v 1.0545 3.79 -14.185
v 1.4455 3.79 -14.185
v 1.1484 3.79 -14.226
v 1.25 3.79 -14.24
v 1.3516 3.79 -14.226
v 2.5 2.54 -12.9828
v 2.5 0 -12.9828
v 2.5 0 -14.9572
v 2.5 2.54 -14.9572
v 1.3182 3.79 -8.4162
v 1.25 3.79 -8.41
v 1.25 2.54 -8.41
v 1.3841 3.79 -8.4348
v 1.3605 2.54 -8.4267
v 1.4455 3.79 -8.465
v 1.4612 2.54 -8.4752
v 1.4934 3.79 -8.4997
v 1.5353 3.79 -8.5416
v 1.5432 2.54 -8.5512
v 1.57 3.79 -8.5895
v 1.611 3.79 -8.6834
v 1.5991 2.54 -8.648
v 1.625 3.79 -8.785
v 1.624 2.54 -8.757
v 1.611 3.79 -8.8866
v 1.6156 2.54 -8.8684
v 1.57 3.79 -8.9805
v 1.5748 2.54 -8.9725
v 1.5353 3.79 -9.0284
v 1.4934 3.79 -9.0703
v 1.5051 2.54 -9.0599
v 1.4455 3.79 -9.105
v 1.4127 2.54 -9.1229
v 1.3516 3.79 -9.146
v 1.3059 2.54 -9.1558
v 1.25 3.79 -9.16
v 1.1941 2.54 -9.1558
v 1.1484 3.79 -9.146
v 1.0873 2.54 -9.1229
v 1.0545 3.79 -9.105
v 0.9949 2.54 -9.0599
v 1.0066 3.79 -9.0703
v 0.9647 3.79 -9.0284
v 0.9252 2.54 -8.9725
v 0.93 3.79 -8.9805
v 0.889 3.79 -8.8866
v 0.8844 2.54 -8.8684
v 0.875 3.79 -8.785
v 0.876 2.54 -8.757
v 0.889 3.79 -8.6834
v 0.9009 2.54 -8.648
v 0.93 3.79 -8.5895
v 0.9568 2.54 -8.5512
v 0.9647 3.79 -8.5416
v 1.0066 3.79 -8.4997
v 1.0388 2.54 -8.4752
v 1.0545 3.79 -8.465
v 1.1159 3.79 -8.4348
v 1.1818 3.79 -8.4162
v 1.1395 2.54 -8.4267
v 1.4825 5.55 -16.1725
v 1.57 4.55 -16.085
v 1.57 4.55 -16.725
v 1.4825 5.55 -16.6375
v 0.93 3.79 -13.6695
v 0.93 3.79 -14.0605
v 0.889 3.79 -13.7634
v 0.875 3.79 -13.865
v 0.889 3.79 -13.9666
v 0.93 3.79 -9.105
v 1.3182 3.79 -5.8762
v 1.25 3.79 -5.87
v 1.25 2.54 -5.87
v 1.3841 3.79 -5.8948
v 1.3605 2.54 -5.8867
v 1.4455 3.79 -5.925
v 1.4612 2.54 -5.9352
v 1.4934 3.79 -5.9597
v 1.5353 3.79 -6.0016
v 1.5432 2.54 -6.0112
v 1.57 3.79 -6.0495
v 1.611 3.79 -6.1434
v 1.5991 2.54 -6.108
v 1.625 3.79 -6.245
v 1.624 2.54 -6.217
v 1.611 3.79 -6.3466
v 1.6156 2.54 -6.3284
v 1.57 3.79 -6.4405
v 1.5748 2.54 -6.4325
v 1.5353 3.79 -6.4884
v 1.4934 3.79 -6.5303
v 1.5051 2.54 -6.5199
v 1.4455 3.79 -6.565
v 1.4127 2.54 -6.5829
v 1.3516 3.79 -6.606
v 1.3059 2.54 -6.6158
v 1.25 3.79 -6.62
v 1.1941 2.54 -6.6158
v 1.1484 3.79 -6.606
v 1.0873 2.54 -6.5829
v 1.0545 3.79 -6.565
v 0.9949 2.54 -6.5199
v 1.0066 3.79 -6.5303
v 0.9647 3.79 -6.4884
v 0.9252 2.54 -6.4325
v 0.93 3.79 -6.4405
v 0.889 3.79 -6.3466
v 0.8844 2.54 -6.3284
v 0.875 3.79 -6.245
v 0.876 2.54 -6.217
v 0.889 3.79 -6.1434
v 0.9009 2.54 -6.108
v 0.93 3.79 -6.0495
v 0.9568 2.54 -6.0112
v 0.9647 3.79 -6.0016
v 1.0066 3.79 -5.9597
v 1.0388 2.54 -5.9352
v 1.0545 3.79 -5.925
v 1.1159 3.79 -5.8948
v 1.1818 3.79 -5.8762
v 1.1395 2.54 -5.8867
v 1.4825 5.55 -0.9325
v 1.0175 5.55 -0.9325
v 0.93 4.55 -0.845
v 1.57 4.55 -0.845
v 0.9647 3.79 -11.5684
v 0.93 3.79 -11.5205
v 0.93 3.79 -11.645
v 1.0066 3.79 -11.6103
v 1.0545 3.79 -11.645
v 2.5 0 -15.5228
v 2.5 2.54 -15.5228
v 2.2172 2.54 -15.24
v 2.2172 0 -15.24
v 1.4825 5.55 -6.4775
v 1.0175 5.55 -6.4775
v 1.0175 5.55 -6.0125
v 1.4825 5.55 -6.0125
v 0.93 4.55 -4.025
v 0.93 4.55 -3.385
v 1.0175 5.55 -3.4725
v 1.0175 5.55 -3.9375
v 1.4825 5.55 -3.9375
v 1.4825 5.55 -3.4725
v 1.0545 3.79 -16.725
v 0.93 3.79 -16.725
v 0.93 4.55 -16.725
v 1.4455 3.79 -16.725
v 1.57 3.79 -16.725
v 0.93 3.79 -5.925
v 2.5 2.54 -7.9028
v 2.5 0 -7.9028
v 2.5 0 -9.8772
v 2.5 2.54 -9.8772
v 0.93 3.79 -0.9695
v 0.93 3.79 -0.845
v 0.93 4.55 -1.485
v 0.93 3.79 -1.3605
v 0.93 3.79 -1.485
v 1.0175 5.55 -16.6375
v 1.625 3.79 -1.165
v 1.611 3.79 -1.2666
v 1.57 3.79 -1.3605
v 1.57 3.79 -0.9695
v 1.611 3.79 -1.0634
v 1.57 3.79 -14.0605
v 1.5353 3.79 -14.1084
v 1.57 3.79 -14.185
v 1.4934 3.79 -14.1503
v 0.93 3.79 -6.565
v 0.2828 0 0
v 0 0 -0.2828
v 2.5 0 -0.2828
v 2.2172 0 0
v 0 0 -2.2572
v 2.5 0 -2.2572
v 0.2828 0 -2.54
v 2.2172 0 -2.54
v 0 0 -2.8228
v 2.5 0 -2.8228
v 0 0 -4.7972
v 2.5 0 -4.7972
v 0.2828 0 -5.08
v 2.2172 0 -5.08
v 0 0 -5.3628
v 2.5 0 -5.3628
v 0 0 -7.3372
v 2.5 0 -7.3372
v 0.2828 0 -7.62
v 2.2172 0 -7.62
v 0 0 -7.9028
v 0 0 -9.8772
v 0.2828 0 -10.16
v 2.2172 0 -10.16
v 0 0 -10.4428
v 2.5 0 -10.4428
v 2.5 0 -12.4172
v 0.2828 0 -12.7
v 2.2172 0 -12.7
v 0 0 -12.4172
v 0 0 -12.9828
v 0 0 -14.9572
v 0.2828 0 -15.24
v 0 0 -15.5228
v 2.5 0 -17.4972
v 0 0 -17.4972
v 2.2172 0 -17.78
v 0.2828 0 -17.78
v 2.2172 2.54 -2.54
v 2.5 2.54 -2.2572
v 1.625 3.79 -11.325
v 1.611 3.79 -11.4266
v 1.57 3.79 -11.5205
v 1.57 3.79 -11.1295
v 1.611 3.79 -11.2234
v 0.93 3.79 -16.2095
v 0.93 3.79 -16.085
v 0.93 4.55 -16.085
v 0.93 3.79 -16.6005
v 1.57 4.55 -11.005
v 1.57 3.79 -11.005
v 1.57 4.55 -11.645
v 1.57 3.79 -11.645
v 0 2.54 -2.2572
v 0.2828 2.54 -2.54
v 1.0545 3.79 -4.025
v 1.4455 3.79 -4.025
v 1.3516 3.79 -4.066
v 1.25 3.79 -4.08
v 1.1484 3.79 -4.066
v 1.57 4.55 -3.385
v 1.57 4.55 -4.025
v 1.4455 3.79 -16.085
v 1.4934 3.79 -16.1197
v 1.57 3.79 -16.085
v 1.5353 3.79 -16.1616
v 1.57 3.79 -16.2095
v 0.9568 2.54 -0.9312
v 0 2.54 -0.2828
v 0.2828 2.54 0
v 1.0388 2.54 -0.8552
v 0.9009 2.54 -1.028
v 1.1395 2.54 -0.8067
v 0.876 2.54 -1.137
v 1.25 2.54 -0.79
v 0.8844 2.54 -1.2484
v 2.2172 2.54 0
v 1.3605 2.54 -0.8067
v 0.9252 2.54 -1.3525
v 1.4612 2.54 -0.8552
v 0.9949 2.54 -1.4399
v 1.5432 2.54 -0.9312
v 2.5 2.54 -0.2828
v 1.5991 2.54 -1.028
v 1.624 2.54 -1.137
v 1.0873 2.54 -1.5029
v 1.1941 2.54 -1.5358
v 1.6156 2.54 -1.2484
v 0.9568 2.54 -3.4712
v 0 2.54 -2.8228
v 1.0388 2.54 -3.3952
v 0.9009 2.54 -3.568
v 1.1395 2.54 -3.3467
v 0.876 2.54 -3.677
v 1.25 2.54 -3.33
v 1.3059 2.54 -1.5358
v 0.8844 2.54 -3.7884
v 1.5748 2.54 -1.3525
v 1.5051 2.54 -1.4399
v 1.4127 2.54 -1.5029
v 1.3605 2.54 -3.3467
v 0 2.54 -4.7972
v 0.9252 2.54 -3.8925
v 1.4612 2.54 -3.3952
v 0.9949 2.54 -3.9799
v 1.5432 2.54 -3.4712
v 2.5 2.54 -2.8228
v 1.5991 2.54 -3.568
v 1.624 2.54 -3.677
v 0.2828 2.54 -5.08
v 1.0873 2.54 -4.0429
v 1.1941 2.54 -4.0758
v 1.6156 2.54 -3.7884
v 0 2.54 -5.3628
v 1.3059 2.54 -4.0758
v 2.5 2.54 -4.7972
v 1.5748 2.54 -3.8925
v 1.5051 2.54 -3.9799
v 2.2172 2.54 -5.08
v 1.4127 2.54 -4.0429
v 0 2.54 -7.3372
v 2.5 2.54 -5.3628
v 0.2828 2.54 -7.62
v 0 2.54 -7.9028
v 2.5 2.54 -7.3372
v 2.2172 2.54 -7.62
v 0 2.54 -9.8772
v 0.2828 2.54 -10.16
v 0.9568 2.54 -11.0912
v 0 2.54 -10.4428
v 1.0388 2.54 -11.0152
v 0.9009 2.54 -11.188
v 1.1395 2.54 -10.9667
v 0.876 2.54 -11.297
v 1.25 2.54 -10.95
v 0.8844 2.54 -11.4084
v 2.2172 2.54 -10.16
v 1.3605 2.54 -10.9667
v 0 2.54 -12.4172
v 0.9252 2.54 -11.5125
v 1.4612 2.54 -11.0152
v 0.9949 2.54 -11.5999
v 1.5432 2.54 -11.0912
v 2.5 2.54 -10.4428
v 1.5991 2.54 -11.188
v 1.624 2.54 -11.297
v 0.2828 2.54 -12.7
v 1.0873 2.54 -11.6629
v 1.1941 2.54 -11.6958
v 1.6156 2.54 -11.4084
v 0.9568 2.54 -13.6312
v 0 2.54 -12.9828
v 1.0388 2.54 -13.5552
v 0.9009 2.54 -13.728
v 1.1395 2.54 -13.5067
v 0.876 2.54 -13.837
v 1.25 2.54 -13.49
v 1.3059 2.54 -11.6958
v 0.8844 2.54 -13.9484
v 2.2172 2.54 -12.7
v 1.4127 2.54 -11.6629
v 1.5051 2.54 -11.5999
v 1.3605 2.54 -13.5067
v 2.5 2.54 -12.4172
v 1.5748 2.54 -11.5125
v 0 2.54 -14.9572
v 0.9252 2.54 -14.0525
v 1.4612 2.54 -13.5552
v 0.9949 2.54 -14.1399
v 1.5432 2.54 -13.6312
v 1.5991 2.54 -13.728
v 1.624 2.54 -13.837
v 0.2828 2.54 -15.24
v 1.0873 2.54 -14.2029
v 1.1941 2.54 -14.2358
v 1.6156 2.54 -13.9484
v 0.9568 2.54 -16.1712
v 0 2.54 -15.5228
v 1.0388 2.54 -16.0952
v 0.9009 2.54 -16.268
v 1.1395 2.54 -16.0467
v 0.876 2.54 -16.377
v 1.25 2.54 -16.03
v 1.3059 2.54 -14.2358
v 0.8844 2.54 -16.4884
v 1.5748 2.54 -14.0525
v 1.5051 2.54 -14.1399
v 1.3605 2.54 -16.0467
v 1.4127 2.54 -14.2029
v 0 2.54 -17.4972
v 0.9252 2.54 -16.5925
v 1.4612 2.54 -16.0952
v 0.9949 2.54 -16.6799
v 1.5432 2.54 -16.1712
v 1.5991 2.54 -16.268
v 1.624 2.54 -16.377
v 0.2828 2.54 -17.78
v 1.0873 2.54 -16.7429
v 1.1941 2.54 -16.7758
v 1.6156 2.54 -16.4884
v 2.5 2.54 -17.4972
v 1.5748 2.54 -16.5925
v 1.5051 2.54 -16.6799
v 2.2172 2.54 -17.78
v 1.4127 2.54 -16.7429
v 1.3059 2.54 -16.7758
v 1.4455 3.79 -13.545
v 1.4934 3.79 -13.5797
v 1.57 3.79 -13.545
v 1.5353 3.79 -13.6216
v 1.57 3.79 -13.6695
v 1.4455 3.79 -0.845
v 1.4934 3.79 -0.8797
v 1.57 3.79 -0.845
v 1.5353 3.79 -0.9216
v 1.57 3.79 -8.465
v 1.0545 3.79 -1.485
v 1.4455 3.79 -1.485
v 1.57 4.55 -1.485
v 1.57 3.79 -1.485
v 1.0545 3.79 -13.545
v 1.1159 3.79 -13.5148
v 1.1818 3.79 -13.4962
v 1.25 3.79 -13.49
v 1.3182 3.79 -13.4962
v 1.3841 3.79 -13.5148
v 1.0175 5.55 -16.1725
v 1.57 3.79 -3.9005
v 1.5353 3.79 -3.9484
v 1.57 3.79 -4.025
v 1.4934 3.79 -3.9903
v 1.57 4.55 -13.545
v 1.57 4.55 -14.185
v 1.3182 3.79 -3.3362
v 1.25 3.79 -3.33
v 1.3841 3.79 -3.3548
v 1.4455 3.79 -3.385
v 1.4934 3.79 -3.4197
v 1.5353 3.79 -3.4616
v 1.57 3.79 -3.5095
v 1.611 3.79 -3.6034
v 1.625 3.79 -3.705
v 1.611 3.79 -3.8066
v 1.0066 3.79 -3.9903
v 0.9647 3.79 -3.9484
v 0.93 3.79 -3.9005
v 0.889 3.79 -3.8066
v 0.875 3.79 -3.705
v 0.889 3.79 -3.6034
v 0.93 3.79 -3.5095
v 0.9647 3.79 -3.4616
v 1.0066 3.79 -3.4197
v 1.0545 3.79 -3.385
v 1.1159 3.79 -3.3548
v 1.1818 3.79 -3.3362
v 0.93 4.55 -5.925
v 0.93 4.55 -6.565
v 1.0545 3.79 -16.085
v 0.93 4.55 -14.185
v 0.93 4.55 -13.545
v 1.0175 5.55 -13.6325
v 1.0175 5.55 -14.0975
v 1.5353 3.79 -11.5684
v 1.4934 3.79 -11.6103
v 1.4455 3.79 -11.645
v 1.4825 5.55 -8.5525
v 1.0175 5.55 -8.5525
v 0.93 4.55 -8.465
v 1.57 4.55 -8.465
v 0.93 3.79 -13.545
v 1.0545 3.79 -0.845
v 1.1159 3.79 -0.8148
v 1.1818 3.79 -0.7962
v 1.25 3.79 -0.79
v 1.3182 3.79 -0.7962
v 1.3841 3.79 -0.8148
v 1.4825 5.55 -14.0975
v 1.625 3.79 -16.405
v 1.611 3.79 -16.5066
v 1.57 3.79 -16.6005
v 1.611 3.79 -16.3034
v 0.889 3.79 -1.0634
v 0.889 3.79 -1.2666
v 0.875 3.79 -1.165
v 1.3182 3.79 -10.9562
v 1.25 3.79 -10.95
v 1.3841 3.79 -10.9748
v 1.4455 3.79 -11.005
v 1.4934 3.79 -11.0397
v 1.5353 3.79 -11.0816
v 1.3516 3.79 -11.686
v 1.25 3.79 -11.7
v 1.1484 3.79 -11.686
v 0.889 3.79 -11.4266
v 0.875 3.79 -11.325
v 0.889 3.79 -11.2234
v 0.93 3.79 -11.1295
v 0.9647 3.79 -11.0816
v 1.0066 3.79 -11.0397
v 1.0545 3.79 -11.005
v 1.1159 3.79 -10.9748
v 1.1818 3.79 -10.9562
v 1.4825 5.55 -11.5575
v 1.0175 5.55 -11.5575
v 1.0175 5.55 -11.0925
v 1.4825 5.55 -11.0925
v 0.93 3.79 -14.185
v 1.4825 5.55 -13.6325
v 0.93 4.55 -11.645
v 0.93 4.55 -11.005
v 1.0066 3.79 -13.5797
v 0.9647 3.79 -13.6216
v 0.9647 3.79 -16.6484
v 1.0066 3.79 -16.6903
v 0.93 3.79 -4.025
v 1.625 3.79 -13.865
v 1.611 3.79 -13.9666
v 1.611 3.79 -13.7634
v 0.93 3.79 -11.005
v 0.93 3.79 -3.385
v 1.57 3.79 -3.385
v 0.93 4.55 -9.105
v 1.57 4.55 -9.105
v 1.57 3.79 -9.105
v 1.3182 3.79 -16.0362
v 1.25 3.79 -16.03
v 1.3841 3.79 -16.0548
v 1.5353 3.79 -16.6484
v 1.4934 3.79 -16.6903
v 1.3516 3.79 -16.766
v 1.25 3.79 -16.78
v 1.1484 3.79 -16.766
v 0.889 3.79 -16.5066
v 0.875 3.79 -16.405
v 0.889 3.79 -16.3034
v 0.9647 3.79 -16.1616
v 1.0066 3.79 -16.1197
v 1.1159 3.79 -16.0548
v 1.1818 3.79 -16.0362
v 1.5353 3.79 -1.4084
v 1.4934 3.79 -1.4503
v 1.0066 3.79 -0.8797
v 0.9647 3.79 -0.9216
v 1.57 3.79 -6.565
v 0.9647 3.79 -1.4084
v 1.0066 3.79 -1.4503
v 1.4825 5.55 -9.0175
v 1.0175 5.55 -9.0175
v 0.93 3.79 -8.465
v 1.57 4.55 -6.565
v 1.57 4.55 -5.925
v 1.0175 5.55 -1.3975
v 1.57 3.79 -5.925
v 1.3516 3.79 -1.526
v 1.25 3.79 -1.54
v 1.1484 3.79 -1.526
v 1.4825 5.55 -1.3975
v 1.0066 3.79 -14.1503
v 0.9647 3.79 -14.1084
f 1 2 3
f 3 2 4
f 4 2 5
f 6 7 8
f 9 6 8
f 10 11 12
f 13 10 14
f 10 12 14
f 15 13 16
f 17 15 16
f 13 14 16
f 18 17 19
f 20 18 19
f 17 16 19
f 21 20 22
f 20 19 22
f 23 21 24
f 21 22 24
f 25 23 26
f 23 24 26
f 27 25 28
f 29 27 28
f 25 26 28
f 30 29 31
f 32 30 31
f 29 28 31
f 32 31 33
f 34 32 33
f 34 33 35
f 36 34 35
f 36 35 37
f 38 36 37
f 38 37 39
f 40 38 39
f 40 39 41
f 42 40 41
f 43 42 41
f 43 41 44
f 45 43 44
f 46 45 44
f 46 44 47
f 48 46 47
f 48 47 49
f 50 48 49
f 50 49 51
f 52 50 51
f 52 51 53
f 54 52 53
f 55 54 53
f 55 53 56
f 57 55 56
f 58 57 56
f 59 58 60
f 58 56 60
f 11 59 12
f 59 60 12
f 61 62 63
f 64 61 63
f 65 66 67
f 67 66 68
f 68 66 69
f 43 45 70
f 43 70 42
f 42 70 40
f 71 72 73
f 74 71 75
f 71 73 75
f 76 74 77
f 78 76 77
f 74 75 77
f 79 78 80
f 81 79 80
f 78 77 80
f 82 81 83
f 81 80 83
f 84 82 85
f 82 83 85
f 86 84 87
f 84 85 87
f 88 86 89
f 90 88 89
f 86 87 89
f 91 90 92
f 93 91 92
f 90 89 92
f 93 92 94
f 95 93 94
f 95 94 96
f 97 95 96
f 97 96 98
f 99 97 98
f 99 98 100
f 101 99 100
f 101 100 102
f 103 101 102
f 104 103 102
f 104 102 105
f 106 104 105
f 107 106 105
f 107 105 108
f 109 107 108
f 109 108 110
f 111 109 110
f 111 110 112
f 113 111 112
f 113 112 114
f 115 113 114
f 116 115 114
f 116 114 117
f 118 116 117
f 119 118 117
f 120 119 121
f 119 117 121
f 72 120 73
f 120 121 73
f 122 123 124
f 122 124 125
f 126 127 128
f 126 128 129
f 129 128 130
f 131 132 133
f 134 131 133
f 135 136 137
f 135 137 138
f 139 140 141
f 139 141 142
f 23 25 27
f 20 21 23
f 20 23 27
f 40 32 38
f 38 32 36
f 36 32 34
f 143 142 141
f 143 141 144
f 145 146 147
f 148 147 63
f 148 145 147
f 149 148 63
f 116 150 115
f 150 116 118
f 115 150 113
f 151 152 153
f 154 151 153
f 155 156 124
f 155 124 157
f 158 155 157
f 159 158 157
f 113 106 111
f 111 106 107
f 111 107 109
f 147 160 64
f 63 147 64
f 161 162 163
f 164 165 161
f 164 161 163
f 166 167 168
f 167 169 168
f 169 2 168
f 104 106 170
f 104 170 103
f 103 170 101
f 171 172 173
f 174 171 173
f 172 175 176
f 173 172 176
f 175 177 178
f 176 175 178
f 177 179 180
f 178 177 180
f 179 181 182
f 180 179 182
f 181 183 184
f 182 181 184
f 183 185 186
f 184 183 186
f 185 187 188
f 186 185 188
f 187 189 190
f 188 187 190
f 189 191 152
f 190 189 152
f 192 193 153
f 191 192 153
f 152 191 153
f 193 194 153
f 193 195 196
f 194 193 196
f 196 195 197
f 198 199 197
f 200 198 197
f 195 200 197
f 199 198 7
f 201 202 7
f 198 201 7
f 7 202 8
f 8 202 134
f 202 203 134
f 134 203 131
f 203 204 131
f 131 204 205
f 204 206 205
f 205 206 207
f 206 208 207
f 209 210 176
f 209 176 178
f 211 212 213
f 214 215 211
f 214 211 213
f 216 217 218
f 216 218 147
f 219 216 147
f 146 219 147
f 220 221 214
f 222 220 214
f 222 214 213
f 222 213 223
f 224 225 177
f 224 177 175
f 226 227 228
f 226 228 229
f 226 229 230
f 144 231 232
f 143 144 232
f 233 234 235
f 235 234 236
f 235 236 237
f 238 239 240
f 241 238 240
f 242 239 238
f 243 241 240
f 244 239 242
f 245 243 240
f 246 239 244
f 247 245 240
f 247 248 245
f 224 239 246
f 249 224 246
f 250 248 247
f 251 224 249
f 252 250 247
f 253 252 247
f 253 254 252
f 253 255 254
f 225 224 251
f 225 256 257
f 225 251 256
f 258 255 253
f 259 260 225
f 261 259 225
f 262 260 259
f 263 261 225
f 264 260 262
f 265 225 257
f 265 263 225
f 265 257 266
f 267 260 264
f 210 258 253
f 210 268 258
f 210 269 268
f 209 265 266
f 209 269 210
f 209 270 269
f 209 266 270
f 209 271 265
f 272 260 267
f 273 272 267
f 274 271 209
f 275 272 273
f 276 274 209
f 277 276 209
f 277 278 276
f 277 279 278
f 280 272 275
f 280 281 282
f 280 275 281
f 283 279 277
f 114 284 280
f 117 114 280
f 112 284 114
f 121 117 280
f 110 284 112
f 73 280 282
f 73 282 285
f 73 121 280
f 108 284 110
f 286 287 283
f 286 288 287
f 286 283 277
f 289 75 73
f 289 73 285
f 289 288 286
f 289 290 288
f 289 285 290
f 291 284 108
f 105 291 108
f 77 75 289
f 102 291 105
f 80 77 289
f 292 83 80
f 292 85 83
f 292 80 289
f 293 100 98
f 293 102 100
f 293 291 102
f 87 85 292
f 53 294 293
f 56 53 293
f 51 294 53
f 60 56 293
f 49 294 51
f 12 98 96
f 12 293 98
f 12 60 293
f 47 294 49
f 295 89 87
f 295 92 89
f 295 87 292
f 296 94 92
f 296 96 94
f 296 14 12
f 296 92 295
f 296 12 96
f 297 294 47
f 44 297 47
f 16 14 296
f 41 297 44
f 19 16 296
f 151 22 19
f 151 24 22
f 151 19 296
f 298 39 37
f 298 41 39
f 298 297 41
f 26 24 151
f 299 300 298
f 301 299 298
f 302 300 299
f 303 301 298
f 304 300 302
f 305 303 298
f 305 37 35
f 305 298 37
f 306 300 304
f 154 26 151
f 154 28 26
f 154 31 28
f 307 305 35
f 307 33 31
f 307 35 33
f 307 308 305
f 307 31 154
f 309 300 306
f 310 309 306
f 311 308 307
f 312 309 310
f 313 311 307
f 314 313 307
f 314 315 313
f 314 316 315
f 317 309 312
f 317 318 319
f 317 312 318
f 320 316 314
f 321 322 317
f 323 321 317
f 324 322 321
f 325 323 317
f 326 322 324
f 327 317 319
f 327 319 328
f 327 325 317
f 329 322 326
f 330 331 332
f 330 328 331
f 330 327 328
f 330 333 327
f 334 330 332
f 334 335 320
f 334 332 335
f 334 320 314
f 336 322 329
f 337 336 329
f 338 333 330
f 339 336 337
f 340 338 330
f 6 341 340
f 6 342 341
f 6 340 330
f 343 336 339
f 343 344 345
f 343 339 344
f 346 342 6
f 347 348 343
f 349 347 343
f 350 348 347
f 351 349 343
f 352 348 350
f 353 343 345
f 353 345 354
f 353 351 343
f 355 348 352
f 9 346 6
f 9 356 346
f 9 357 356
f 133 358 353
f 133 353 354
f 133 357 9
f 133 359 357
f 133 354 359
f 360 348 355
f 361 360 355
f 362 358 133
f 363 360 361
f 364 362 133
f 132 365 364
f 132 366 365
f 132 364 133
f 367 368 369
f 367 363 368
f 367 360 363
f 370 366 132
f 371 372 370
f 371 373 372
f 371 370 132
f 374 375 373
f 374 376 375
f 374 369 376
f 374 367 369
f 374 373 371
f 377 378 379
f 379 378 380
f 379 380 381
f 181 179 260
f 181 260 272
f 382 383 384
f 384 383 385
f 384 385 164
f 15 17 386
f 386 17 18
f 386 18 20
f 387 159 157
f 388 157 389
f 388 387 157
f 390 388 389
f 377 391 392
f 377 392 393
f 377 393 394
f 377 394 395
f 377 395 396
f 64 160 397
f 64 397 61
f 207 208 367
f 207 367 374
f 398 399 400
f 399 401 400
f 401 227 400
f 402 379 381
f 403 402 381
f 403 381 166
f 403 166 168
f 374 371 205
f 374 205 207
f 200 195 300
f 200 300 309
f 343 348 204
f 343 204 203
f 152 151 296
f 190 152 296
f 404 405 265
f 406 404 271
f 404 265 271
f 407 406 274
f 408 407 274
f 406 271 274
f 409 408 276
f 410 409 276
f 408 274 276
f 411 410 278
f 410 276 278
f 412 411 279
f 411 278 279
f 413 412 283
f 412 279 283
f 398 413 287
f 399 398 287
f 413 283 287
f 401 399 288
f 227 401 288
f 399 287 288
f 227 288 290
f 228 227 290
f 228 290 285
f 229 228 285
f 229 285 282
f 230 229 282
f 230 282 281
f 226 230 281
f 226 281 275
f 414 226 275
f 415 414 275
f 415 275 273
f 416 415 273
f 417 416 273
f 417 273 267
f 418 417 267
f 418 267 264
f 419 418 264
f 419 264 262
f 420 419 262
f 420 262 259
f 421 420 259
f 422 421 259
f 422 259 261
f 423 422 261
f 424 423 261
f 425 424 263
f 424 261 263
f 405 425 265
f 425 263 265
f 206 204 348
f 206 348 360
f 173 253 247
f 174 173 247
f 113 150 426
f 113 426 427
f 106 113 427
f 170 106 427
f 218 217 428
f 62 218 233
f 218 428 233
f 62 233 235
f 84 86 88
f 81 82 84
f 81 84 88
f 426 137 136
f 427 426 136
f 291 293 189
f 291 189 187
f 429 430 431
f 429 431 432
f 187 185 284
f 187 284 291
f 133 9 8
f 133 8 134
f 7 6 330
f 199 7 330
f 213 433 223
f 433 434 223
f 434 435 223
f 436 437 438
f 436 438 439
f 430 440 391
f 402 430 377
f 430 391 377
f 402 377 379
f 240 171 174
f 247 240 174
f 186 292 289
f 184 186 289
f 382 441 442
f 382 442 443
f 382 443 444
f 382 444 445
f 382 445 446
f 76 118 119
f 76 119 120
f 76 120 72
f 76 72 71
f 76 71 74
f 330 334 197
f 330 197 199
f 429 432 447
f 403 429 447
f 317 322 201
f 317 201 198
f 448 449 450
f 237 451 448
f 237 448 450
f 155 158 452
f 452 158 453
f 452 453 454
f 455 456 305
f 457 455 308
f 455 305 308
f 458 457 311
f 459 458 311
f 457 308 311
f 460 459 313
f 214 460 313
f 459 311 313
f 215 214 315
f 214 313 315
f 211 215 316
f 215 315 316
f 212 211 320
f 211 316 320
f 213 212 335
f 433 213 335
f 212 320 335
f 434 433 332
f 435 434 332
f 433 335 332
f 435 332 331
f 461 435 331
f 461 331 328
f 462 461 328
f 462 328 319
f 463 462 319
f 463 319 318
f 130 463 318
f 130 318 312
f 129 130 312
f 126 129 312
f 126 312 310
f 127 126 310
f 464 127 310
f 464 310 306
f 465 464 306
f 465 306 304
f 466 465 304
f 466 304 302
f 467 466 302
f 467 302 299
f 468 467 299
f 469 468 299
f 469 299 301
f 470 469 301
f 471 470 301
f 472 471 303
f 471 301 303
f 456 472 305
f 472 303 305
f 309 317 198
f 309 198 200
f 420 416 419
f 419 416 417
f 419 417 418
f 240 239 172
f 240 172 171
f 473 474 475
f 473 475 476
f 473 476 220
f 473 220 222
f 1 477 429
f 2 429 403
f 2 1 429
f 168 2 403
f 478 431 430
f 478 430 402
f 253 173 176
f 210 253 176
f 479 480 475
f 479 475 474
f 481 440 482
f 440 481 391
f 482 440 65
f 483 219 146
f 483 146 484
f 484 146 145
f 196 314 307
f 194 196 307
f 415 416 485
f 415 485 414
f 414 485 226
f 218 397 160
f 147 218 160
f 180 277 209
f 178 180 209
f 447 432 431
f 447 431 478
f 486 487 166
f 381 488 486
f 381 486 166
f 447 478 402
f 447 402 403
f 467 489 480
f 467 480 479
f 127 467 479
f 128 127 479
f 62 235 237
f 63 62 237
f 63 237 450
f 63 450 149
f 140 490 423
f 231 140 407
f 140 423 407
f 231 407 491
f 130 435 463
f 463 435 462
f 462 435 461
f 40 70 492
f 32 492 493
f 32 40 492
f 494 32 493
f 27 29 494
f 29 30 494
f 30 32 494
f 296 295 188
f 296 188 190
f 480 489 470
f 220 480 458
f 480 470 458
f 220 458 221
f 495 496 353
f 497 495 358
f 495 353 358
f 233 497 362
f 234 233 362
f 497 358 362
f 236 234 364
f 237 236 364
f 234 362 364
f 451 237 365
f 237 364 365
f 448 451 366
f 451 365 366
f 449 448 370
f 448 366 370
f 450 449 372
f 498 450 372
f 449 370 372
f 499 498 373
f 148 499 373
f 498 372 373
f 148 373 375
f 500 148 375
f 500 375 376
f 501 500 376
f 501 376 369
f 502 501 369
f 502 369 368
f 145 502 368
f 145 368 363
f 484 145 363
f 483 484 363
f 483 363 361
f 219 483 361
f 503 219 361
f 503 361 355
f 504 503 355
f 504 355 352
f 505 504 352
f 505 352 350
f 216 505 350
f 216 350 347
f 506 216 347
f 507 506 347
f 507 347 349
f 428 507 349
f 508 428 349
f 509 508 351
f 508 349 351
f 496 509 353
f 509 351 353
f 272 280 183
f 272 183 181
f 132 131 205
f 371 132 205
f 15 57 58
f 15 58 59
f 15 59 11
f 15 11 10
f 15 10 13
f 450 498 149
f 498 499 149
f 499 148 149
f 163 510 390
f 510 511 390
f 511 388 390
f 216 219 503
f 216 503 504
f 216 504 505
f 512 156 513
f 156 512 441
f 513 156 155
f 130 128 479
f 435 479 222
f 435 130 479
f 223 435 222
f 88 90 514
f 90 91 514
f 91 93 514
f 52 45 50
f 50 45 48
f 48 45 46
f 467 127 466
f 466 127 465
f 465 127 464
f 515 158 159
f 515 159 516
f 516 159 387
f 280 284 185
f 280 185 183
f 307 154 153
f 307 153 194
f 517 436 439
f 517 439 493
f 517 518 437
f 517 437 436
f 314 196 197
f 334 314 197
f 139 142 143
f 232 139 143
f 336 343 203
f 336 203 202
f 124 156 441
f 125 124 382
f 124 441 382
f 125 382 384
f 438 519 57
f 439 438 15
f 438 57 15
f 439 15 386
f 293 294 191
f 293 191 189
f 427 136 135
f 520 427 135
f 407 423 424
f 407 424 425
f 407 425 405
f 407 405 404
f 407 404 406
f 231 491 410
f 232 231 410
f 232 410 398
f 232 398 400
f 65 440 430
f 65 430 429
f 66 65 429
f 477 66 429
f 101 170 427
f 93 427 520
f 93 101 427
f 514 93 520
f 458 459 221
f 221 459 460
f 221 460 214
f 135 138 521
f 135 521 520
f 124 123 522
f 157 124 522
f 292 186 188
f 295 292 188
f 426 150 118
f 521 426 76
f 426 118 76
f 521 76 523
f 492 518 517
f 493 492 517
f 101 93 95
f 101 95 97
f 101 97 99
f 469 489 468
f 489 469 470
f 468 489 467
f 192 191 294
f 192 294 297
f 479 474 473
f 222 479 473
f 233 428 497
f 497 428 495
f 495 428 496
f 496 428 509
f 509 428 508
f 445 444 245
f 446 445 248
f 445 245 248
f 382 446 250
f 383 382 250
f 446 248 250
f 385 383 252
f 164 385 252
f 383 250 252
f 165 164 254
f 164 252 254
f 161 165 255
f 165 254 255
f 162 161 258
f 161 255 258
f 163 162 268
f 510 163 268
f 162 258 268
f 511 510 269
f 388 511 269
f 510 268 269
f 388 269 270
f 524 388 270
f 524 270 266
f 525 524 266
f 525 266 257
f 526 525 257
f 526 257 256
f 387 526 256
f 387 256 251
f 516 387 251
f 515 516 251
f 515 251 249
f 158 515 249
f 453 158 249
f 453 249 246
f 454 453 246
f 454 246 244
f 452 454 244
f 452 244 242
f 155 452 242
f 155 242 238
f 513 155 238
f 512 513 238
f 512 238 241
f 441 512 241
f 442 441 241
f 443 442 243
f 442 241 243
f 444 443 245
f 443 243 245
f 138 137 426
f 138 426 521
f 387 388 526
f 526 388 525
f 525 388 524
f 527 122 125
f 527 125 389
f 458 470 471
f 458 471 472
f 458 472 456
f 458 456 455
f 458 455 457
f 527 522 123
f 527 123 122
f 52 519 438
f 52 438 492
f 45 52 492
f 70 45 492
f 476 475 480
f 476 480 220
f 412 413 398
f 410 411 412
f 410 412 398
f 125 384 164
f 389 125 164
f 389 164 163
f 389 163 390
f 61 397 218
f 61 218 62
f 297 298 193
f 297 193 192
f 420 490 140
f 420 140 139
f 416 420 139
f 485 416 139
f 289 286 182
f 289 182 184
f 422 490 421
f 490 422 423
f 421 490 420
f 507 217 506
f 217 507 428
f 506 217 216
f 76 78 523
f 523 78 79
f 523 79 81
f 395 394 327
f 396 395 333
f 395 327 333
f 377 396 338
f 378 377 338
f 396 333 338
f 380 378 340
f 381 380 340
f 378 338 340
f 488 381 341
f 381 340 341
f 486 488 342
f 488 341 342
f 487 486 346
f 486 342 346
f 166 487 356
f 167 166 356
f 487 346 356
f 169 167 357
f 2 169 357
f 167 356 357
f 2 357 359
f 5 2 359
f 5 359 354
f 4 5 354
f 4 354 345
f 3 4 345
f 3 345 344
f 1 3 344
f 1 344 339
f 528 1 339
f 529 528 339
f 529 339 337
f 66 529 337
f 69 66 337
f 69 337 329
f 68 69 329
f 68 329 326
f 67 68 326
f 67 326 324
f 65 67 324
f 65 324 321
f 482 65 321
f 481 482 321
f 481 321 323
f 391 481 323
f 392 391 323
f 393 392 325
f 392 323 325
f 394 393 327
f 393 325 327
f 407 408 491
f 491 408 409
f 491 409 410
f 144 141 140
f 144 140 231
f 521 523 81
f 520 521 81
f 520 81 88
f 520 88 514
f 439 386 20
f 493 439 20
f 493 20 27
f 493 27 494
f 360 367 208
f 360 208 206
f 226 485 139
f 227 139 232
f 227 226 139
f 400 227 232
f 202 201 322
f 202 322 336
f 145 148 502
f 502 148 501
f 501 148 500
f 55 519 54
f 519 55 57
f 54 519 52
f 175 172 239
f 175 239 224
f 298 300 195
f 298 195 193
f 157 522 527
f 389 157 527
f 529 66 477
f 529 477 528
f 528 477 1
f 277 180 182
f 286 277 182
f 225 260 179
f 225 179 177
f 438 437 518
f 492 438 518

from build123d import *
from OCP.BRepFilletAPI import BRepFilletAPI_MakeChamfer

# Parameters (mm, degrees)
SKETCH1_W           = 2.5
SKETCH1_H           = 2.54
BOSS_EXTRUDE1_DEPTH = 2.54
SKETCH3_R           = 0.375
BOSS_EXTRUDE2_DEPTH = 1.25
SKETCH4_W           = 0.64
SKETCH4_H           = 0.64
BOSS_EXTRUDE3_DEPTH = 1.76
CUT_EXTRUDE1_DEPTH  = 2.54
LPATTERN5_COUNT     = 7
LPATTERN5_PITCH     = 2.54
CHAMFER3_SIZE       = 1
CHAMFER3_SIZE2      = 0.087488664


with BuildPart() as part:
    # Sketch1 → Boss-Extrude1 (new body)
    with BuildSketch(Plane(origin=(0, 0, 0), x_dir=(1, 0, 0), z_dir=(0, 1, 0))):
        with Locations((1.25, 1.27)):
            Rectangle(SKETCH1_W, SKETCH1_H)
    boss_extrude1 = extrude(amount=BOSS_EXTRUDE1_DEPTH)

    # Sketch3 → Boss-Extrude2 (add)
    with BuildSketch(Plane(origin=(0, 2.54, 0), x_dir=(1, 0, 0), z_dir=(0, 1, 0))):
        with Locations(Location((1.25, 1.165, 0), (0, 0, 270))):
            Circle(SKETCH3_R)
    boss_extrude2 = extrude(amount=BOSS_EXTRUDE2_DEPTH)

    # Sketch4 → Boss-Extrude3 (add)
    with BuildSketch(Plane(origin=(0, 3.79, 0), x_dir=(1, 0, 0), z_dir=(0, 1, 0))):
        with Locations((1.25, 1.165)):
            Rectangle(SKETCH4_W, SKETCH4_H)
    boss_extrude3 = extrude(amount=BOSS_EXTRUDE3_DEPTH)

    # Sketch5 → Cut-Extrude1 (cut)
    with BuildSketch(Plane(origin=(0, 2.54, 0), x_dir=(1, 0, 0), z_dir=(0, 1, 0))):
        Polygon((0.282842712, 2.54), (0, 2.257157288), (0, 2.54), align=None)
        Polygon((2.5, 2.54), (2.5, 2.257157288), (2.217157288, 2.54), align=None)
        Polygon((2.5, 0), (2.5, 0.282842712), (2.217157288, 0), align=None)
        Polygon((0, 0), (0, 0.282842712), (0.282842712, 0), align=None)
    cut_extrude1 = extrude(amount=-CUT_EXTRUDE1_DEPTH, mode=Mode.SUBTRACT)

    # LPattern5: Boss-Extrude1, Boss-Extrude2, Boss-Extrude3, Cut-Extrude1 ×7
    with Locations(*[(0, 0, -i * LPATTERN5_PITCH) for i in range(1, LPATTERN5_COUNT)]):
        add(boss_extrude1)
        add(boss_extrude2)
        add(boss_extrude3)
        add(cut_extrude1, mode=Mode.SUBTRACT)

    # Chamfer3: one chamfer whose edges measure the first distance from different faces: ONE call of the kernel's chamfer builder (chamfer() names one face for all edges)
    chamfer3_edges_1 = [part.edges().sort_by_distance(p)[0] for p in [
        (1.57, 5.55, -3.705),
    ]]
    chamfer3_side_1 = [part.faces().sort_by_distance(p)[0] for p in [
        (1.57, 4.67, -3.705),
    ]]
    chamfer3_edges_2 = [part.edges().sort_by_distance(p)[0] for p in [
        (1.25, 5.55, -4.025),
    ]]
    chamfer3_side_2 = [part.faces().sort_by_distance(p)[0] for p in [
        (1.25, 4.67, -4.025),
    ]]
    chamfer3_edges_3 = [part.edges().sort_by_distance(p)[0] for p in [
        (0.93, 5.55, -3.705),
    ]]
    chamfer3_side_3 = [part.faces().sort_by_distance(p)[0] for p in [
        (0.93, 4.67, -3.705),
    ]]
    chamfer3_edges_4 = [part.edges().sort_by_distance(p)[0] for p in [
        (1.25, 5.55, -3.385),
    ]]
    chamfer3_side_4 = [part.faces().sort_by_distance(p)[0] for p in [
        (1.25, 4.67, -3.385),
    ]]
    chamfer3_edges_5 = [part.edges().sort_by_distance(p)[0] for p in [
        (1.57, 5.55, -6.245),
    ]]
    chamfer3_side_5 = [part.faces().sort_by_distance(p)[0] for p in [
        (1.57, 4.67, -6.245),
    ]]
    chamfer3_edges_6 = [part.edges().sort_by_distance(p)[0] for p in [
        (1.25, 5.55, -6.565),
    ]]
    chamfer3_side_6 = [part.faces().sort_by_distance(p)[0] for p in [
        (1.25, 4.67, -6.565),
    ]]
    chamfer3_edges_7 = [part.edges().sort_by_distance(p)[0] for p in [
        (0.93, 5.55, -6.245),
    ]]
    chamfer3_side_7 = [part.faces().sort_by_distance(p)[0] for p in [
        (0.93, 4.67, -6.245),
    ]]
    chamfer3_edges_8 = [part.edges().sort_by_distance(p)[0] for p in [
        (1.25, 5.55, -5.925),
    ]]
    chamfer3_side_8 = [part.faces().sort_by_distance(p)[0] for p in [
        (1.25, 4.67, -5.925),
    ]]
    chamfer3_edges_9 = [part.edges().sort_by_distance(p)[0] for p in [
        (1.57, 5.55, -8.785),
    ]]
    chamfer3_side_9 = [part.faces().sort_by_distance(p)[0] for p in [
        (1.57, 4.67, -8.785),
    ]]
    chamfer3_edges_10 = [part.edges().sort_by_distance(p)[0] for p in [
        (1.25, 5.55, -9.105),
    ]]
    chamfer3_side_10 = [part.faces().sort_by_distance(p)[0] for p in [
        (1.25, 4.67, -9.105),
    ]]
    chamfer3_edges_11 = [part.edges().sort_by_distance(p)[0] for p in [
        (0.93, 5.55, -8.785),
    ]]
    chamfer3_side_11 = [part.faces().sort_by_distance(p)[0] for p in [
        (0.93, 4.67, -8.785),
    ]]
    chamfer3_edges_12 = [part.edges().sort_by_distance(p)[0] for p in [
        (1.25, 5.55, -8.465),
    ]]
    chamfer3_side_12 = [part.faces().sort_by_distance(p)[0] for p in [
        (1.25, 4.67, -8.465),
    ]]
    chamfer3_edges_13 = [part.edges().sort_by_distance(p)[0] for p in [
        (1.57, 5.55, -11.325),
    ]]
    chamfer3_side_13 = [part.faces().sort_by_distance(p)[0] for p in [
        (1.57, 4.67, -11.325),
    ]]
    chamfer3_edges_14 = [part.edges().sort_by_distance(p)[0] for p in [
        (1.25, 5.55, -11.645),
    ]]
    chamfer3_side_14 = [part.faces().sort_by_distance(p)[0] for p in [
        (1.25, 4.67, -11.645),
    ]]
    chamfer3_edges_15 = [part.edges().sort_by_distance(p)[0] for p in [
        (0.93, 5.55, -11.325),
    ]]
    chamfer3_side_15 = [part.faces().sort_by_distance(p)[0] for p in [
        (0.93, 4.67, -11.325),
    ]]
    chamfer3_edges_16 = [part.edges().sort_by_distance(p)[0] for p in [
        (1.25, 5.55, -11.005),
    ]]
    chamfer3_side_16 = [part.faces().sort_by_distance(p)[0] for p in [
        (1.25, 4.67, -11.005),
    ]]
    chamfer3_edges_17 = [part.edges().sort_by_distance(p)[0] for p in [
        (1.57, 5.55, -13.865),
    ]]
    chamfer3_side_17 = [part.faces().sort_by_distance(p)[0] for p in [
        (1.57, 4.67, -13.865),
    ]]
    chamfer3_edges_18 = [part.edges().sort_by_distance(p)[0] for p in [
        (1.25, 5.55, -14.185),
    ]]
    chamfer3_side_18 = [part.faces().sort_by_distance(p)[0] for p in [
        (1.25, 4.67, -14.185),
    ]]
    chamfer3_edges_19 = [part.edges().sort_by_distance(p)[0] for p in [
        (0.93, 5.55, -13.865),
    ]]
    chamfer3_side_19 = [part.faces().sort_by_distance(p)[0] for p in [
        (0.93, 4.67, -13.865),
    ]]
    chamfer3_edges_20 = [part.edges().sort_by_distance(p)[0] for p in [
        (1.25, 5.55, -13.545),
    ]]
    chamfer3_side_20 = [part.faces().sort_by_distance(p)[0] for p in [
        (1.25, 4.67, -13.545),
    ]]
    chamfer3_edges_21 = [part.edges().sort_by_distance(p)[0] for p in [
        (1.57, 5.55, -16.405),
    ]]
    chamfer3_side_21 = [part.faces().sort_by_distance(p)[0] for p in [
        (1.57, 4.67, -16.405),
    ]]
    chamfer3_edges_22 = [part.edges().sort_by_distance(p)[0] for p in [
        (1.25, 5.55, -16.725),
    ]]
    chamfer3_side_22 = [part.faces().sort_by_distance(p)[0] for p in [
        (1.25, 4.67, -16.725),
    ]]
    chamfer3_edges_23 = [part.edges().sort_by_distance(p)[0] for p in [
        (0.93, 5.55, -16.405),
    ]]
    chamfer3_side_23 = [part.faces().sort_by_distance(p)[0] for p in [
        (0.93, 4.67, -16.405),
    ]]
    chamfer3_edges_24 = [part.edges().sort_by_distance(p)[0] for p in [
        (1.25, 5.55, -16.085),
    ]]
    chamfer3_side_24 = [part.faces().sort_by_distance(p)[0] for p in [
        (1.25, 4.67, -16.085),
    ]]
    chamfer3_edges_25 = [part.edges().sort_by_distance(p)[0] for p in [
        (1.57, 5.55, -1.165),
    ]]
    chamfer3_side_25 = [part.faces().sort_by_distance(p)[0] for p in [
        (1.57, 4.67, -1.165),
    ]]
    chamfer3_edges_26 = [part.edges().sort_by_distance(p)[0] for p in [
        (1.25, 5.55, -1.485),
    ]]
    chamfer3_side_26 = [part.faces().sort_by_distance(p)[0] for p in [
        (1.25, 4.67, -1.485),
    ]]
    chamfer3_edges_27 = [part.edges().sort_by_distance(p)[0] for p in [
        (0.93, 5.55, -1.165),
    ]]
    chamfer3_side_27 = [part.faces().sort_by_distance(p)[0] for p in [
        (0.93, 4.67, -1.165),
    ]]
    chamfer3_edges_28 = [part.edges().sort_by_distance(p)[0] for p in [
        (1.25, 5.55, -0.845),
    ]]
    chamfer3_side_28 = [part.faces().sort_by_distance(p)[0] for p in [
        (1.25, 4.67, -0.845),
    ]]
    chamfer3 = BRepFilletAPI_MakeChamfer(part.part.solid().wrapped)
    for e in chamfer3_edges_1:
        chamfer3.Add(CHAMFER3_SIZE, CHAMFER3_SIZE2, e.wrapped, chamfer3_side_1[0].wrapped)  # the first distance lies on this face
    for e in chamfer3_edges_2:
        chamfer3.Add(CHAMFER3_SIZE, CHAMFER3_SIZE2, e.wrapped, chamfer3_side_2[0].wrapped)  # the first distance lies on this face
    for e in chamfer3_edges_3:
        chamfer3.Add(CHAMFER3_SIZE, CHAMFER3_SIZE2, e.wrapped, chamfer3_side_3[0].wrapped)  # the first distance lies on this face
    for e in chamfer3_edges_4:
        chamfer3.Add(CHAMFER3_SIZE, CHAMFER3_SIZE2, e.wrapped, chamfer3_side_4[0].wrapped)  # the first distance lies on this face
    for e in chamfer3_edges_5:
        chamfer3.Add(CHAMFER3_SIZE, CHAMFER3_SIZE2, e.wrapped, chamfer3_side_5[0].wrapped)  # the first distance lies on this face
    for e in chamfer3_edges_6:
        chamfer3.Add(CHAMFER3_SIZE, CHAMFER3_SIZE2, e.wrapped, chamfer3_side_6[0].wrapped)  # the first distance lies on this face
    for e in chamfer3_edges_7:
        chamfer3.Add(CHAMFER3_SIZE, CHAMFER3_SIZE2, e.wrapped, chamfer3_side_7[0].wrapped)  # the first distance lies on this face
    for e in chamfer3_edges_8:
        chamfer3.Add(CHAMFER3_SIZE, CHAMFER3_SIZE2, e.wrapped, chamfer3_side_8[0].wrapped)  # the first distance lies on this face
    for e in chamfer3_edges_9:
        chamfer3.Add(CHAMFER3_SIZE, CHAMFER3_SIZE2, e.wrapped, chamfer3_side_9[0].wrapped)  # the first distance lies on this face
    for e in chamfer3_edges_10:
        chamfer3.Add(CHAMFER3_SIZE, CHAMFER3_SIZE2, e.wrapped, chamfer3_side_10[0].wrapped)  # the first distance lies on this face
    for e in chamfer3_edges_11:
        chamfer3.Add(CHAMFER3_SIZE, CHAMFER3_SIZE2, e.wrapped, chamfer3_side_11[0].wrapped)  # the first distance lies on this face
    for e in chamfer3_edges_12:
        chamfer3.Add(CHAMFER3_SIZE, CHAMFER3_SIZE2, e.wrapped, chamfer3_side_12[0].wrapped)  # the first distance lies on this face
    for e in chamfer3_edges_13:
        chamfer3.Add(CHAMFER3_SIZE, CHAMFER3_SIZE2, e.wrapped, chamfer3_side_13[0].wrapped)  # the first distance lies on this face
    for e in chamfer3_edges_14:
        chamfer3.Add(CHAMFER3_SIZE, CHAMFER3_SIZE2, e.wrapped, chamfer3_side_14[0].wrapped)  # the first distance lies on this face
    for e in chamfer3_edges_15:
        chamfer3.Add(CHAMFER3_SIZE, CHAMFER3_SIZE2, e.wrapped, chamfer3_side_15[0].wrapped)  # the first distance lies on this face
    for e in chamfer3_edges_16:
        chamfer3.Add(CHAMFER3_SIZE, CHAMFER3_SIZE2, e.wrapped, chamfer3_side_16[0].wrapped)  # the first distance lies on this face
    for e in chamfer3_edges_17:
        chamfer3.Add(CHAMFER3_SIZE, CHAMFER3_SIZE2, e.wrapped, chamfer3_side_17[0].wrapped)  # the first distance lies on this face
    for e in chamfer3_edges_18:
        chamfer3.Add(CHAMFER3_SIZE, CHAMFER3_SIZE2, e.wrapped, chamfer3_side_18[0].wrapped)  # the first distance lies on this face
    for e in chamfer3_edges_19:
        chamfer3.Add(CHAMFER3_SIZE, CHAMFER3_SIZE2, e.wrapped, chamfer3_side_19[0].wrapped)  # the first distance lies on this face
    for e in chamfer3_edges_20:
        chamfer3.Add(CHAMFER3_SIZE, CHAMFER3_SIZE2, e.wrapped, chamfer3_side_20[0].wrapped)  # the first distance lies on this face
    for e in chamfer3_edges_21:
        chamfer3.Add(CHAMFER3_SIZE, CHAMFER3_SIZE2, e.wrapped, chamfer3_side_21[0].wrapped)  # the first distance lies on this face
    for e in chamfer3_edges_22:
        chamfer3.Add(CHAMFER3_SIZE, CHAMFER3_SIZE2, e.wrapped, chamfer3_side_22[0].wrapped)  # the first distance lies on this face
    for e in chamfer3_edges_23:
        chamfer3.Add(CHAMFER3_SIZE, CHAMFER3_SIZE2, e.wrapped, chamfer3_side_23[0].wrapped)  # the first distance lies on this face
    for e in chamfer3_edges_24:
        chamfer3.Add(CHAMFER3_SIZE, CHAMFER3_SIZE2, e.wrapped, chamfer3_side_24[0].wrapped)  # the first distance lies on this face
    for e in chamfer3_edges_25:
        chamfer3.Add(CHAMFER3_SIZE, CHAMFER3_SIZE2, e.wrapped, chamfer3_side_25[0].wrapped)  # the first distance lies on this face
    for e in chamfer3_edges_26:
        chamfer3.Add(CHAMFER3_SIZE, CHAMFER3_SIZE2, e.wrapped, chamfer3_side_26[0].wrapped)  # the first distance lies on this face
    for e in chamfer3_edges_27:
        chamfer3.Add(CHAMFER3_SIZE, CHAMFER3_SIZE2, e.wrapped, chamfer3_side_27[0].wrapped)  # the first distance lies on this face
    for e in chamfer3_edges_28:
        chamfer3.Add(CHAMFER3_SIZE, CHAMFER3_SIZE2, e.wrapped, chamfer3_side_28[0].wrapped)  # the first distance lies on this face
    add(Compound.cast(chamfer3.Shape()), mode=Mode.REPLACE)


solid = part.part
